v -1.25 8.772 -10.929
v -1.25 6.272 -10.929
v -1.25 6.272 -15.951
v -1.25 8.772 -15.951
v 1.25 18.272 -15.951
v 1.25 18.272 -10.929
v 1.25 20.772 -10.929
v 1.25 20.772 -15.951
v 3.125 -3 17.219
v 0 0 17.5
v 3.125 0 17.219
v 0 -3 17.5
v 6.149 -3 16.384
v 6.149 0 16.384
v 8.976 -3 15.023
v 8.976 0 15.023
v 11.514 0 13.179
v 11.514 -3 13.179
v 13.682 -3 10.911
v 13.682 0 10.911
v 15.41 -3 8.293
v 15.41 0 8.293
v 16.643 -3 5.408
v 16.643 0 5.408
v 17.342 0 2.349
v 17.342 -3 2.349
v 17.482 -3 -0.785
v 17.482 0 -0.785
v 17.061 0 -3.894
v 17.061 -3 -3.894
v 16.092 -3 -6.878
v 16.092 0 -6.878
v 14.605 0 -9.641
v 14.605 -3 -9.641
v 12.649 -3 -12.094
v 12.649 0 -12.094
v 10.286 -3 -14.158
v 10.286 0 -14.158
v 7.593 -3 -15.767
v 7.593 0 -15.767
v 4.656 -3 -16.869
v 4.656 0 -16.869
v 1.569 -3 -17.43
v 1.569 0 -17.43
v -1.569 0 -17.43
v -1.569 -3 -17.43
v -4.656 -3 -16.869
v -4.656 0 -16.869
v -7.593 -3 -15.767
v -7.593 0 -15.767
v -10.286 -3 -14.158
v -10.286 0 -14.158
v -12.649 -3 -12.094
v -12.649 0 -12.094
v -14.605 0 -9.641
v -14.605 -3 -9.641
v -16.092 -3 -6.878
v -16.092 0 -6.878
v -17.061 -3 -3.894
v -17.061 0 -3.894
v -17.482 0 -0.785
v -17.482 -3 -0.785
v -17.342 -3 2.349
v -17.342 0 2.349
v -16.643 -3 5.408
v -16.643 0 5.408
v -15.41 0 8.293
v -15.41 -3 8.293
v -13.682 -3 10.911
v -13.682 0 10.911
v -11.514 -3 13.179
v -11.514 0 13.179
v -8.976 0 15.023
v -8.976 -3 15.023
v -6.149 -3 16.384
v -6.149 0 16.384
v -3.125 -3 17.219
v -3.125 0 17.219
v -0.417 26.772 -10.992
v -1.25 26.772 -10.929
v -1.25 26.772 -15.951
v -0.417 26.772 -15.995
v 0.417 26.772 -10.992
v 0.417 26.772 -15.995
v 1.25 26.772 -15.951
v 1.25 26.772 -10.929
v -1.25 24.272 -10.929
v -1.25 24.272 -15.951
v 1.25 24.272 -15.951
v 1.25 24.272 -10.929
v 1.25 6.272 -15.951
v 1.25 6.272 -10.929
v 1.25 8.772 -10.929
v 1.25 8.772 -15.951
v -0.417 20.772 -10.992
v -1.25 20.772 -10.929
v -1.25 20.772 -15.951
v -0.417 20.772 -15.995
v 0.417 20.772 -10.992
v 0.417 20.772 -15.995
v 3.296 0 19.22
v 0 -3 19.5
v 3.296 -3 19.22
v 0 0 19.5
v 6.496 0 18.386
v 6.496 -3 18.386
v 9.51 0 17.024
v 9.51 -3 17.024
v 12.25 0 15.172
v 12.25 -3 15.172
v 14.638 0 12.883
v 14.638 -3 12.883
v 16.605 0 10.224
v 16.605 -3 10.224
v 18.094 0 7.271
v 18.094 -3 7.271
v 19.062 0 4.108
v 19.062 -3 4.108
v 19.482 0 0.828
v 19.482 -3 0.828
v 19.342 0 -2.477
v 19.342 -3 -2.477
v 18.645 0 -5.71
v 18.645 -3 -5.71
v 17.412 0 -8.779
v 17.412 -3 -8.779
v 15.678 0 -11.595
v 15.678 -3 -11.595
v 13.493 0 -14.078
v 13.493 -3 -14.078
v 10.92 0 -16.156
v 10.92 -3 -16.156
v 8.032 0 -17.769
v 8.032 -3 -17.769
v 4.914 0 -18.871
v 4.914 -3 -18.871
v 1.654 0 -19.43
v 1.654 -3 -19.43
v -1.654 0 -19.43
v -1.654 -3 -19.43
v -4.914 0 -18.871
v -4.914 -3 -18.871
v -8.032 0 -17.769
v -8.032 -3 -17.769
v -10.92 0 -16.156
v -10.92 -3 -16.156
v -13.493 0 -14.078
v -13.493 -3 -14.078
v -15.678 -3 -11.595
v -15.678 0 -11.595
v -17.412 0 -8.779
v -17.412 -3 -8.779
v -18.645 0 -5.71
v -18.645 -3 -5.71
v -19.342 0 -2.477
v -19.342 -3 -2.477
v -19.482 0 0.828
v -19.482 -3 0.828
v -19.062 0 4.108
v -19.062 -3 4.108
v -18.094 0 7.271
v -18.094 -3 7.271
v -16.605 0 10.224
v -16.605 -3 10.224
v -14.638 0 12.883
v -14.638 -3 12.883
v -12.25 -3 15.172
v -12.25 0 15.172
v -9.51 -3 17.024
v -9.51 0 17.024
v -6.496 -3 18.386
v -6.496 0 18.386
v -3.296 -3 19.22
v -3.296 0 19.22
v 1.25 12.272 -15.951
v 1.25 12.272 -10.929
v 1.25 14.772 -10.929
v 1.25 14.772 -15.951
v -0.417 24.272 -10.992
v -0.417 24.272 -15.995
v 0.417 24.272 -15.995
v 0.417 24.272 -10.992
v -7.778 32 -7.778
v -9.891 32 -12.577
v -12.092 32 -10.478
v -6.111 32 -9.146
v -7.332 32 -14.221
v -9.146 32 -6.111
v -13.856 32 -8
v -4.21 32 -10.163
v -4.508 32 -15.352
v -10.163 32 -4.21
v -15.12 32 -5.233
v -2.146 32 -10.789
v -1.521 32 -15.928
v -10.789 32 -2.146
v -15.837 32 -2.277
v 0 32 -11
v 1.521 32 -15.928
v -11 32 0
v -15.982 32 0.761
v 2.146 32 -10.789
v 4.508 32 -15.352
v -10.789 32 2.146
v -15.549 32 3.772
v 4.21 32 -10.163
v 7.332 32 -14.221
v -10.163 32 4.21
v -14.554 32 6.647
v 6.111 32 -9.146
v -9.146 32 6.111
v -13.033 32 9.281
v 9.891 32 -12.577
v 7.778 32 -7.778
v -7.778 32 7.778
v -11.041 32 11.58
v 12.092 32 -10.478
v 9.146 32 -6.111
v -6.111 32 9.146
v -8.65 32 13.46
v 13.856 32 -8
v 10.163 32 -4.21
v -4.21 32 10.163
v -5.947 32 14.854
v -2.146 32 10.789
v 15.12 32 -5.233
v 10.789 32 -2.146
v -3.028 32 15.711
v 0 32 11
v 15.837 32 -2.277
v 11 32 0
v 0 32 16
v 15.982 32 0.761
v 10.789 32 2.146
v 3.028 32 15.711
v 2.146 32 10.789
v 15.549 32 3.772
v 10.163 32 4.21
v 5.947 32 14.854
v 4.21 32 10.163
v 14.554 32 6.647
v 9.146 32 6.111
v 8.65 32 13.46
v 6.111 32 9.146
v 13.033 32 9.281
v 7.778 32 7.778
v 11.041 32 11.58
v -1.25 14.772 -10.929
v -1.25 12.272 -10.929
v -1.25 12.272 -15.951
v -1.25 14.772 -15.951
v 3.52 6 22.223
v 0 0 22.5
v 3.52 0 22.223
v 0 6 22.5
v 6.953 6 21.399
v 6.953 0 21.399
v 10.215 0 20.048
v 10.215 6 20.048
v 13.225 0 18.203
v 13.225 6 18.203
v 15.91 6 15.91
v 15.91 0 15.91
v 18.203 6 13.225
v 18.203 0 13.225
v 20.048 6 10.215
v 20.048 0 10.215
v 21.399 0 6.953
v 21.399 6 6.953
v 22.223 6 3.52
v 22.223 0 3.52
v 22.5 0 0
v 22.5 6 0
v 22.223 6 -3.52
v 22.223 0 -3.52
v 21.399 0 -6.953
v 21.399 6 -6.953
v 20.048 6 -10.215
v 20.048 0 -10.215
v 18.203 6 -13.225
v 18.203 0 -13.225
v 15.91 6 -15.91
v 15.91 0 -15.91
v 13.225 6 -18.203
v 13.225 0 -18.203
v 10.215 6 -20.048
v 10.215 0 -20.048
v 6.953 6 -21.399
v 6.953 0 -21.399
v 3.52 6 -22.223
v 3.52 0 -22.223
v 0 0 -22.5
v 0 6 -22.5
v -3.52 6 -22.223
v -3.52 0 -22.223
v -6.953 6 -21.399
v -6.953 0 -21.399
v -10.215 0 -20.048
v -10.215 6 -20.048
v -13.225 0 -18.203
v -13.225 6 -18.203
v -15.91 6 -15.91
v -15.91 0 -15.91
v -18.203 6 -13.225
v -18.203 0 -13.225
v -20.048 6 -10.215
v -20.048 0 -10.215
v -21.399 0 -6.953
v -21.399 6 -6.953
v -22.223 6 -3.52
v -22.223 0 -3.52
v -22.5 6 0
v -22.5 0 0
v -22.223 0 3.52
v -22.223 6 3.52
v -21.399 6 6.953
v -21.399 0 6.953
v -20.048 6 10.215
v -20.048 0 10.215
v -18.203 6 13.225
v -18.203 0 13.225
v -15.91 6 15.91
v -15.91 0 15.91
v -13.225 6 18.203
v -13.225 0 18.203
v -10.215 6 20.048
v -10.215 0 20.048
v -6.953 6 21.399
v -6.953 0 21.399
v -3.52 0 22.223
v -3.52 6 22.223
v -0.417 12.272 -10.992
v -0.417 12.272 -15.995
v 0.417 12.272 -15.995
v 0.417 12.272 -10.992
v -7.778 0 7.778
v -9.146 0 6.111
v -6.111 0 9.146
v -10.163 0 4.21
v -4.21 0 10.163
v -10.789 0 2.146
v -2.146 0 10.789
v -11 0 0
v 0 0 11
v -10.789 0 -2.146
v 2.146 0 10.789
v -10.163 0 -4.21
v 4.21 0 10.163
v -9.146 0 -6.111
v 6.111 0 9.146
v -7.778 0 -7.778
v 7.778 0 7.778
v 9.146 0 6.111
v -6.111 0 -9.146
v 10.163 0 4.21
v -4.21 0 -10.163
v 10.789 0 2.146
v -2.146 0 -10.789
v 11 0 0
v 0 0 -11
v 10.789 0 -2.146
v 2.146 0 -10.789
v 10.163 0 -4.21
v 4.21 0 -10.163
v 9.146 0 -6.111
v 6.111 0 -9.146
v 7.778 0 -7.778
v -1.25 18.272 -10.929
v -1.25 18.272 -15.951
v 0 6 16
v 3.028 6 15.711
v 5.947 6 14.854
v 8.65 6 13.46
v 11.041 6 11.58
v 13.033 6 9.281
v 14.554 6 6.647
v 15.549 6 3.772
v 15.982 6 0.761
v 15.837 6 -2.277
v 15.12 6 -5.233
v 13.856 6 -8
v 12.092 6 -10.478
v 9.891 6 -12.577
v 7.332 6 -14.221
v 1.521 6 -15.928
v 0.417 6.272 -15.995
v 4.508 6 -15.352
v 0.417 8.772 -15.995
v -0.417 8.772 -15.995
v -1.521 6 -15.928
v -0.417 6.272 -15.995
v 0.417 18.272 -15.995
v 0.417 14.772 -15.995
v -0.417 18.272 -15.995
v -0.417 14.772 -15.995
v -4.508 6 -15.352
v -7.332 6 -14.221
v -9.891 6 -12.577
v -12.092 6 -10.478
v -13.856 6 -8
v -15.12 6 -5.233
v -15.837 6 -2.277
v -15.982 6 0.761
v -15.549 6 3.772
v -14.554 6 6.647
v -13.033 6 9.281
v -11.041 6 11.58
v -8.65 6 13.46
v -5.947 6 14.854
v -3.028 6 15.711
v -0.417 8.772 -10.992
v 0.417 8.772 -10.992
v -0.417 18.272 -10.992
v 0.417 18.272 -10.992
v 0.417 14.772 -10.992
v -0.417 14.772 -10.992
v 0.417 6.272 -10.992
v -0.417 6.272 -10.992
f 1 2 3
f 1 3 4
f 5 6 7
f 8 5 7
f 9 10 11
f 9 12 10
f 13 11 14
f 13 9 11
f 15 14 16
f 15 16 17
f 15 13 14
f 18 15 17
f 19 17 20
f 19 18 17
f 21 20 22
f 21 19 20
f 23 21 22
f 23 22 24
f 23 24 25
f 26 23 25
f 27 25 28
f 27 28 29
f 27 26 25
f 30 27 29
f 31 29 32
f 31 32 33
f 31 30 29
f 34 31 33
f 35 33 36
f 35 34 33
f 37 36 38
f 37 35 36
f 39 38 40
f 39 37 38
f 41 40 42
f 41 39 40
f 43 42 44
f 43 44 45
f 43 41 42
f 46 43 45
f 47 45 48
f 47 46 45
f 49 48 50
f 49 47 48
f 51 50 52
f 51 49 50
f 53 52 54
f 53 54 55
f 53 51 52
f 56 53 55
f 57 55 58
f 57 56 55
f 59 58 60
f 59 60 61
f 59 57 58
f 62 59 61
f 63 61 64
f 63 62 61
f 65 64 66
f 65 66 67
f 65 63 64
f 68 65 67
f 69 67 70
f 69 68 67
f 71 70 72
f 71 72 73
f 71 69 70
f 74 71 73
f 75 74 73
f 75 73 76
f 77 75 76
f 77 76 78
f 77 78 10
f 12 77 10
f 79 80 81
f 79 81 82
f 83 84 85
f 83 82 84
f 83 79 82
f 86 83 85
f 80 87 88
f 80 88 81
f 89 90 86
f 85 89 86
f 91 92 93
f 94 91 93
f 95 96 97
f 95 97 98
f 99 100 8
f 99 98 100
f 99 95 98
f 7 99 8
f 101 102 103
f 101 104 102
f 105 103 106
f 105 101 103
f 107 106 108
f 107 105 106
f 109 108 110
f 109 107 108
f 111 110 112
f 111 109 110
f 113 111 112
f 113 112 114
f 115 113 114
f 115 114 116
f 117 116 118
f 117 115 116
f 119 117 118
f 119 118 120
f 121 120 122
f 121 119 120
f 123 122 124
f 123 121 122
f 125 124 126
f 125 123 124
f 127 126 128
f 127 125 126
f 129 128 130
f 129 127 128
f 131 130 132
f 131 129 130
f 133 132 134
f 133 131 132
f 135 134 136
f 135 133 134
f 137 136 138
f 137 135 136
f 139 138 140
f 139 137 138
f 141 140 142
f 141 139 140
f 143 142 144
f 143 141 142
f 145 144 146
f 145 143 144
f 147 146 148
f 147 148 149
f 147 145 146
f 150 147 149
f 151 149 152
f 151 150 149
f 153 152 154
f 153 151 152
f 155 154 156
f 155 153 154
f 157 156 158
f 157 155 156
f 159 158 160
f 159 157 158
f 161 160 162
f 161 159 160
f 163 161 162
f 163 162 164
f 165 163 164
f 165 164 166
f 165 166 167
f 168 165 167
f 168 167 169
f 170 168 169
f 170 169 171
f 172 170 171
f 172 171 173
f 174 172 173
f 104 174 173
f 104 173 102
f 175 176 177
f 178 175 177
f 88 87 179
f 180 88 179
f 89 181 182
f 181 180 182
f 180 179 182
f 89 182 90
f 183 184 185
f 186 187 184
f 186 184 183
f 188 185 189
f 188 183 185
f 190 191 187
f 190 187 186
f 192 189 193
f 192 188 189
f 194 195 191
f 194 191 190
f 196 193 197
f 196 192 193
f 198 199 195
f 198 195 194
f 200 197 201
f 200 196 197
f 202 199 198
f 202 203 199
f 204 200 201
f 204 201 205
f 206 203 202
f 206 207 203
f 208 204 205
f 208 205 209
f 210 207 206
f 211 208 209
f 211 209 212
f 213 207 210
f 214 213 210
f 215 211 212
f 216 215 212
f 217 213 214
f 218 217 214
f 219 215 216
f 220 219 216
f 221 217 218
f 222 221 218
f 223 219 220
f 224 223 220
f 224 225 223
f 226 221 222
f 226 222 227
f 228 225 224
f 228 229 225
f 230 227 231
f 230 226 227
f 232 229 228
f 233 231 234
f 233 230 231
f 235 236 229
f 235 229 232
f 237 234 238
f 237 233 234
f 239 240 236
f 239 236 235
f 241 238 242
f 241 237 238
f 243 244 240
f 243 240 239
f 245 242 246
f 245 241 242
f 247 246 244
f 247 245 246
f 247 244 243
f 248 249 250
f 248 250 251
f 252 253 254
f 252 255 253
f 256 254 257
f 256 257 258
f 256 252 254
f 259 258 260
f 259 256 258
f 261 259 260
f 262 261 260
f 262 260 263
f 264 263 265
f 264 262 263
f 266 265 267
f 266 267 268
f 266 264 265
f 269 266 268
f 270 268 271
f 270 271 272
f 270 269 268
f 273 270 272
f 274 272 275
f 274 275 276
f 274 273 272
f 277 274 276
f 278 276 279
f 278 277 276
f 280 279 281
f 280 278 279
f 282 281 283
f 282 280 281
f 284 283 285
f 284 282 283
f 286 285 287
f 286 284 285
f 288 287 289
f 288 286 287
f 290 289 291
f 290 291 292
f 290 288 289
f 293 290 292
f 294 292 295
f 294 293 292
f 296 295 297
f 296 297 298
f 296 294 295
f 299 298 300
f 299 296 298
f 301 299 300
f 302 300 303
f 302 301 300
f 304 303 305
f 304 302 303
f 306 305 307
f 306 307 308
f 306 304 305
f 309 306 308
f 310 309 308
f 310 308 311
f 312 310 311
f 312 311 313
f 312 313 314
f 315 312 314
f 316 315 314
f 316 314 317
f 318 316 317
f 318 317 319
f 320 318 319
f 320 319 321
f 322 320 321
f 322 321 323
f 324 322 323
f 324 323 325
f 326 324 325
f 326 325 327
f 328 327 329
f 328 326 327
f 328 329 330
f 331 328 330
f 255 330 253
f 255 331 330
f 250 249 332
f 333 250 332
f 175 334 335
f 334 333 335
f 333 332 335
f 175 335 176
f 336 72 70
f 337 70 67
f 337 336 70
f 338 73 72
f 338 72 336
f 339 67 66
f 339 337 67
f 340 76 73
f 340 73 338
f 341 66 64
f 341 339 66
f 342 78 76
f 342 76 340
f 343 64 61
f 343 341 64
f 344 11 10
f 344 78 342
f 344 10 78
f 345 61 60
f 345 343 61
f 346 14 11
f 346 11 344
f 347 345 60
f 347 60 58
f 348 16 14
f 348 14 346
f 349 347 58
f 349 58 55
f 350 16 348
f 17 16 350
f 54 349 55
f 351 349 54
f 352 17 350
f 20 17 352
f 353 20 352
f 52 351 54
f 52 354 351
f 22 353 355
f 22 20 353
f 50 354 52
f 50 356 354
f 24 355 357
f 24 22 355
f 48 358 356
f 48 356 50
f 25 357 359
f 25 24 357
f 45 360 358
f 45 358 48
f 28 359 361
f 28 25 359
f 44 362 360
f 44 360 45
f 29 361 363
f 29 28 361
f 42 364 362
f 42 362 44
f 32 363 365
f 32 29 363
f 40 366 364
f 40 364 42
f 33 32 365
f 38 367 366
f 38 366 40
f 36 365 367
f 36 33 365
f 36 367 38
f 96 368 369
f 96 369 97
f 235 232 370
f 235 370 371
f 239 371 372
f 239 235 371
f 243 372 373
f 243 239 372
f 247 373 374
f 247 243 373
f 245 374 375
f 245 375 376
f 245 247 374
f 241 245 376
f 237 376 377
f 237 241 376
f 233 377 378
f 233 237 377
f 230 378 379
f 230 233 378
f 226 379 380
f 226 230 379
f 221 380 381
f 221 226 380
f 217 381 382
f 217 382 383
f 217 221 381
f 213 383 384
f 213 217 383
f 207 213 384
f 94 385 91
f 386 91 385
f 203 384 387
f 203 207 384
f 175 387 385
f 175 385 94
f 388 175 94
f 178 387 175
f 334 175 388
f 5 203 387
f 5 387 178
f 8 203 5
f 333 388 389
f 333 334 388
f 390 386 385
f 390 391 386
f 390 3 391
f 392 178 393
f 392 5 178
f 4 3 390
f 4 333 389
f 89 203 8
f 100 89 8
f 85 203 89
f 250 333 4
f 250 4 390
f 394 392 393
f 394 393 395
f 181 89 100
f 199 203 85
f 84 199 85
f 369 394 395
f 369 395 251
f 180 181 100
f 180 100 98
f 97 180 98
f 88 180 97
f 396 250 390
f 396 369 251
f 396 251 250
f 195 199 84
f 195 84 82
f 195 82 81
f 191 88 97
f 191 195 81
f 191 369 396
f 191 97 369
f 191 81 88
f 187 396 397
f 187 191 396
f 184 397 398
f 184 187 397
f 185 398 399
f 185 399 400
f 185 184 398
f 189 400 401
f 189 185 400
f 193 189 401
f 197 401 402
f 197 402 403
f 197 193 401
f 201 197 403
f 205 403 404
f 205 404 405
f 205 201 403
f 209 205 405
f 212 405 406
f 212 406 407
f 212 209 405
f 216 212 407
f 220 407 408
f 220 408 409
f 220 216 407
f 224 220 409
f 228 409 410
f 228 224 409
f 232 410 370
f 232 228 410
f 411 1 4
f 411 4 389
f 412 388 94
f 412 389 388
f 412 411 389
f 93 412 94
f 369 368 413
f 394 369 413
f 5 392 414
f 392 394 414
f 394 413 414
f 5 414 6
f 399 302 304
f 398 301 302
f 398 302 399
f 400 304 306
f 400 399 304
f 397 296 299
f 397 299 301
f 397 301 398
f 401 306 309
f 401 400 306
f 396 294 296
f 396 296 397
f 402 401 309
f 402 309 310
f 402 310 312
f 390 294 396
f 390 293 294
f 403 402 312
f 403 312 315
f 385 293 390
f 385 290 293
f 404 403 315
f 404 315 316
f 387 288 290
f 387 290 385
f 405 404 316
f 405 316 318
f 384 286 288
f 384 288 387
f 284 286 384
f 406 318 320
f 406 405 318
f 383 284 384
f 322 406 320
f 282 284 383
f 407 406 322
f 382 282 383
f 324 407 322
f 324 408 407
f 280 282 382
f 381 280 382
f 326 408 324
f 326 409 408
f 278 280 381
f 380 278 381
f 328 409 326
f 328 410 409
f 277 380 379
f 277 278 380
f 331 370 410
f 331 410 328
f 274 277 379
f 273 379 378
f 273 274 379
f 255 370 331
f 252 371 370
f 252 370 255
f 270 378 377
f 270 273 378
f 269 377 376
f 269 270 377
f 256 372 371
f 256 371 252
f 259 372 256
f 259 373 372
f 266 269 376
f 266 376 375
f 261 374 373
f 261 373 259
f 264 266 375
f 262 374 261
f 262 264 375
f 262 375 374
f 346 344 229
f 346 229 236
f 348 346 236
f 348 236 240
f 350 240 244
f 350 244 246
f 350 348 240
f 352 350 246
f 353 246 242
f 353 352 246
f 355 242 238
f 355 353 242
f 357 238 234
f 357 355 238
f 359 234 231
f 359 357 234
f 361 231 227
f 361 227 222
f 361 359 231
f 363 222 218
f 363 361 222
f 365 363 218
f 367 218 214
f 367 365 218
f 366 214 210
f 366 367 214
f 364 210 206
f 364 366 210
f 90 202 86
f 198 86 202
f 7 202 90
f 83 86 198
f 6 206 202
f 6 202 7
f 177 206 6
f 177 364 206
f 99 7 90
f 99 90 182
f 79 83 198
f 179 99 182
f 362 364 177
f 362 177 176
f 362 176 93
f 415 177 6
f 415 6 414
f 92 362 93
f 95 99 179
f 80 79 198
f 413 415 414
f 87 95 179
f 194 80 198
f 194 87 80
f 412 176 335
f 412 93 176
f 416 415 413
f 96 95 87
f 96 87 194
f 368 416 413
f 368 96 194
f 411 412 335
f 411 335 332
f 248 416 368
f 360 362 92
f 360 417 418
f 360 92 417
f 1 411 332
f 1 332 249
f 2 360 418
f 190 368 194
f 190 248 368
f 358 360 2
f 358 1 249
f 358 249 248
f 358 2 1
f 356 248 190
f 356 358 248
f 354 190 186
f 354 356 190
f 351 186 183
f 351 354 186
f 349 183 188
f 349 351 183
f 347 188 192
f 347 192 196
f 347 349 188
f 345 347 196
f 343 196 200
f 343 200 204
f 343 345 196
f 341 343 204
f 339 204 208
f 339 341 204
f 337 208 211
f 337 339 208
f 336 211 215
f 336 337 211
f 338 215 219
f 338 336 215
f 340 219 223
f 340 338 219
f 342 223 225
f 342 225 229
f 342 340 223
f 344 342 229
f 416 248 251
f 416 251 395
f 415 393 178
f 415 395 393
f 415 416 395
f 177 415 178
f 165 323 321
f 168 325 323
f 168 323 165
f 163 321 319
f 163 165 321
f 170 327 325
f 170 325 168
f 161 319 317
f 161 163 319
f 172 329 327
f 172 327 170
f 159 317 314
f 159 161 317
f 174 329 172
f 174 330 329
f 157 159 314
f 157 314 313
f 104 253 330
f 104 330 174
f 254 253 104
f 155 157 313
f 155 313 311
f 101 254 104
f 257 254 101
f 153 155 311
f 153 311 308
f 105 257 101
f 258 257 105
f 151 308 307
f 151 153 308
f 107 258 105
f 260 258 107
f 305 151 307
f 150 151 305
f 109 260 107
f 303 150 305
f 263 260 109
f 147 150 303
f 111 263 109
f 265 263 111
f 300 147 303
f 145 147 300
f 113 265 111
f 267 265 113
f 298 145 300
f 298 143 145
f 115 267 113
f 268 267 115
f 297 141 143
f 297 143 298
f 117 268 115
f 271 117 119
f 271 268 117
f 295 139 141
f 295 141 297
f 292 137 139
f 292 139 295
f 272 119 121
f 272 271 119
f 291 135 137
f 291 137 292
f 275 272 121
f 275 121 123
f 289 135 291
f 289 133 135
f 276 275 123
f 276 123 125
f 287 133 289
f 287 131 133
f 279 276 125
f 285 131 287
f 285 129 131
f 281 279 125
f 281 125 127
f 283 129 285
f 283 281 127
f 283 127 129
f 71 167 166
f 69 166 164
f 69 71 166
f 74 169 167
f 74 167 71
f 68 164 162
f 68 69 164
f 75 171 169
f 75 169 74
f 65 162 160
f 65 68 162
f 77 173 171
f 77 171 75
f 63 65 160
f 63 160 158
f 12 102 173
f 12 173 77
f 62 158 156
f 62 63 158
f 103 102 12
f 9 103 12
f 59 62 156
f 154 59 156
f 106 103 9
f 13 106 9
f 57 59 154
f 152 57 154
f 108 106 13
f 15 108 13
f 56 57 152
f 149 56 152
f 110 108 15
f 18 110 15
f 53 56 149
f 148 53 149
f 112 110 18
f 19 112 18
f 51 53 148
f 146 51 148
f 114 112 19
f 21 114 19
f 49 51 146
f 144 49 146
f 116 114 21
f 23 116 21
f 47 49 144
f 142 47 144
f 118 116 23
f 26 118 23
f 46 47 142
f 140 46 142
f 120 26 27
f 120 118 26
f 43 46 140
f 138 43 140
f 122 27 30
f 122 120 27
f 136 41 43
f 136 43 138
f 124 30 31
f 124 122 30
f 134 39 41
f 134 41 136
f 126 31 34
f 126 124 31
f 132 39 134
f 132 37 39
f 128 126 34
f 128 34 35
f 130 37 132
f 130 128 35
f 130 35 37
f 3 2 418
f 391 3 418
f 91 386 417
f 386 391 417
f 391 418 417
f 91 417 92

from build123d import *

# Parameters (mm, degrees)
SKETCH4_W          = 2.5
SKETCH4_H          = 2.5
CUT_EXTRUDE1_DEPTH = 20


with BuildPart() as part:
    # Sketch2 → Revolve1 (revolve)
    with BuildSketch(Plane.XY, mode=Mode.PRIVATE) as revolve1_sk:
        Polygon((11, 0), (17.5, 0), (17.5, -3), (19.5, -3), (19.5, 0), (22.5, 0), (22.5, 6), (16, 6), (16, 32), (11, 32), (11, 6), align=None)
    revolve(revolve1_sk.sketch.rotate(Axis((0, 28.805193162, 0), (0, 1, 0)), 270), axis=Axis((0, 28.805193162, 0), (0, 1, 0)))

    # Sketch4 → Cut-Extrude1 (cut)
    with BuildSketch(Plane.XY):
        with Locations((0, 13.522413215)):
            Rectangle(SKETCH4_W, SKETCH4_H)
        with Locations((0, 7.522413215)):
            Rectangle(SKETCH4_W, SKETCH4_H)
        with Locations((0, 19.522413215)):
            Rectangle(SKETCH4_W, SKETCH4_H)
        with Locations((0, 25.522413215)):
            Rectangle(SKETCH4_W, SKETCH4_H)
    extrude(amount=-CUT_EXTRUDE1_DEPTH, mode=Mode.SUBTRACT)


solid = part.part
